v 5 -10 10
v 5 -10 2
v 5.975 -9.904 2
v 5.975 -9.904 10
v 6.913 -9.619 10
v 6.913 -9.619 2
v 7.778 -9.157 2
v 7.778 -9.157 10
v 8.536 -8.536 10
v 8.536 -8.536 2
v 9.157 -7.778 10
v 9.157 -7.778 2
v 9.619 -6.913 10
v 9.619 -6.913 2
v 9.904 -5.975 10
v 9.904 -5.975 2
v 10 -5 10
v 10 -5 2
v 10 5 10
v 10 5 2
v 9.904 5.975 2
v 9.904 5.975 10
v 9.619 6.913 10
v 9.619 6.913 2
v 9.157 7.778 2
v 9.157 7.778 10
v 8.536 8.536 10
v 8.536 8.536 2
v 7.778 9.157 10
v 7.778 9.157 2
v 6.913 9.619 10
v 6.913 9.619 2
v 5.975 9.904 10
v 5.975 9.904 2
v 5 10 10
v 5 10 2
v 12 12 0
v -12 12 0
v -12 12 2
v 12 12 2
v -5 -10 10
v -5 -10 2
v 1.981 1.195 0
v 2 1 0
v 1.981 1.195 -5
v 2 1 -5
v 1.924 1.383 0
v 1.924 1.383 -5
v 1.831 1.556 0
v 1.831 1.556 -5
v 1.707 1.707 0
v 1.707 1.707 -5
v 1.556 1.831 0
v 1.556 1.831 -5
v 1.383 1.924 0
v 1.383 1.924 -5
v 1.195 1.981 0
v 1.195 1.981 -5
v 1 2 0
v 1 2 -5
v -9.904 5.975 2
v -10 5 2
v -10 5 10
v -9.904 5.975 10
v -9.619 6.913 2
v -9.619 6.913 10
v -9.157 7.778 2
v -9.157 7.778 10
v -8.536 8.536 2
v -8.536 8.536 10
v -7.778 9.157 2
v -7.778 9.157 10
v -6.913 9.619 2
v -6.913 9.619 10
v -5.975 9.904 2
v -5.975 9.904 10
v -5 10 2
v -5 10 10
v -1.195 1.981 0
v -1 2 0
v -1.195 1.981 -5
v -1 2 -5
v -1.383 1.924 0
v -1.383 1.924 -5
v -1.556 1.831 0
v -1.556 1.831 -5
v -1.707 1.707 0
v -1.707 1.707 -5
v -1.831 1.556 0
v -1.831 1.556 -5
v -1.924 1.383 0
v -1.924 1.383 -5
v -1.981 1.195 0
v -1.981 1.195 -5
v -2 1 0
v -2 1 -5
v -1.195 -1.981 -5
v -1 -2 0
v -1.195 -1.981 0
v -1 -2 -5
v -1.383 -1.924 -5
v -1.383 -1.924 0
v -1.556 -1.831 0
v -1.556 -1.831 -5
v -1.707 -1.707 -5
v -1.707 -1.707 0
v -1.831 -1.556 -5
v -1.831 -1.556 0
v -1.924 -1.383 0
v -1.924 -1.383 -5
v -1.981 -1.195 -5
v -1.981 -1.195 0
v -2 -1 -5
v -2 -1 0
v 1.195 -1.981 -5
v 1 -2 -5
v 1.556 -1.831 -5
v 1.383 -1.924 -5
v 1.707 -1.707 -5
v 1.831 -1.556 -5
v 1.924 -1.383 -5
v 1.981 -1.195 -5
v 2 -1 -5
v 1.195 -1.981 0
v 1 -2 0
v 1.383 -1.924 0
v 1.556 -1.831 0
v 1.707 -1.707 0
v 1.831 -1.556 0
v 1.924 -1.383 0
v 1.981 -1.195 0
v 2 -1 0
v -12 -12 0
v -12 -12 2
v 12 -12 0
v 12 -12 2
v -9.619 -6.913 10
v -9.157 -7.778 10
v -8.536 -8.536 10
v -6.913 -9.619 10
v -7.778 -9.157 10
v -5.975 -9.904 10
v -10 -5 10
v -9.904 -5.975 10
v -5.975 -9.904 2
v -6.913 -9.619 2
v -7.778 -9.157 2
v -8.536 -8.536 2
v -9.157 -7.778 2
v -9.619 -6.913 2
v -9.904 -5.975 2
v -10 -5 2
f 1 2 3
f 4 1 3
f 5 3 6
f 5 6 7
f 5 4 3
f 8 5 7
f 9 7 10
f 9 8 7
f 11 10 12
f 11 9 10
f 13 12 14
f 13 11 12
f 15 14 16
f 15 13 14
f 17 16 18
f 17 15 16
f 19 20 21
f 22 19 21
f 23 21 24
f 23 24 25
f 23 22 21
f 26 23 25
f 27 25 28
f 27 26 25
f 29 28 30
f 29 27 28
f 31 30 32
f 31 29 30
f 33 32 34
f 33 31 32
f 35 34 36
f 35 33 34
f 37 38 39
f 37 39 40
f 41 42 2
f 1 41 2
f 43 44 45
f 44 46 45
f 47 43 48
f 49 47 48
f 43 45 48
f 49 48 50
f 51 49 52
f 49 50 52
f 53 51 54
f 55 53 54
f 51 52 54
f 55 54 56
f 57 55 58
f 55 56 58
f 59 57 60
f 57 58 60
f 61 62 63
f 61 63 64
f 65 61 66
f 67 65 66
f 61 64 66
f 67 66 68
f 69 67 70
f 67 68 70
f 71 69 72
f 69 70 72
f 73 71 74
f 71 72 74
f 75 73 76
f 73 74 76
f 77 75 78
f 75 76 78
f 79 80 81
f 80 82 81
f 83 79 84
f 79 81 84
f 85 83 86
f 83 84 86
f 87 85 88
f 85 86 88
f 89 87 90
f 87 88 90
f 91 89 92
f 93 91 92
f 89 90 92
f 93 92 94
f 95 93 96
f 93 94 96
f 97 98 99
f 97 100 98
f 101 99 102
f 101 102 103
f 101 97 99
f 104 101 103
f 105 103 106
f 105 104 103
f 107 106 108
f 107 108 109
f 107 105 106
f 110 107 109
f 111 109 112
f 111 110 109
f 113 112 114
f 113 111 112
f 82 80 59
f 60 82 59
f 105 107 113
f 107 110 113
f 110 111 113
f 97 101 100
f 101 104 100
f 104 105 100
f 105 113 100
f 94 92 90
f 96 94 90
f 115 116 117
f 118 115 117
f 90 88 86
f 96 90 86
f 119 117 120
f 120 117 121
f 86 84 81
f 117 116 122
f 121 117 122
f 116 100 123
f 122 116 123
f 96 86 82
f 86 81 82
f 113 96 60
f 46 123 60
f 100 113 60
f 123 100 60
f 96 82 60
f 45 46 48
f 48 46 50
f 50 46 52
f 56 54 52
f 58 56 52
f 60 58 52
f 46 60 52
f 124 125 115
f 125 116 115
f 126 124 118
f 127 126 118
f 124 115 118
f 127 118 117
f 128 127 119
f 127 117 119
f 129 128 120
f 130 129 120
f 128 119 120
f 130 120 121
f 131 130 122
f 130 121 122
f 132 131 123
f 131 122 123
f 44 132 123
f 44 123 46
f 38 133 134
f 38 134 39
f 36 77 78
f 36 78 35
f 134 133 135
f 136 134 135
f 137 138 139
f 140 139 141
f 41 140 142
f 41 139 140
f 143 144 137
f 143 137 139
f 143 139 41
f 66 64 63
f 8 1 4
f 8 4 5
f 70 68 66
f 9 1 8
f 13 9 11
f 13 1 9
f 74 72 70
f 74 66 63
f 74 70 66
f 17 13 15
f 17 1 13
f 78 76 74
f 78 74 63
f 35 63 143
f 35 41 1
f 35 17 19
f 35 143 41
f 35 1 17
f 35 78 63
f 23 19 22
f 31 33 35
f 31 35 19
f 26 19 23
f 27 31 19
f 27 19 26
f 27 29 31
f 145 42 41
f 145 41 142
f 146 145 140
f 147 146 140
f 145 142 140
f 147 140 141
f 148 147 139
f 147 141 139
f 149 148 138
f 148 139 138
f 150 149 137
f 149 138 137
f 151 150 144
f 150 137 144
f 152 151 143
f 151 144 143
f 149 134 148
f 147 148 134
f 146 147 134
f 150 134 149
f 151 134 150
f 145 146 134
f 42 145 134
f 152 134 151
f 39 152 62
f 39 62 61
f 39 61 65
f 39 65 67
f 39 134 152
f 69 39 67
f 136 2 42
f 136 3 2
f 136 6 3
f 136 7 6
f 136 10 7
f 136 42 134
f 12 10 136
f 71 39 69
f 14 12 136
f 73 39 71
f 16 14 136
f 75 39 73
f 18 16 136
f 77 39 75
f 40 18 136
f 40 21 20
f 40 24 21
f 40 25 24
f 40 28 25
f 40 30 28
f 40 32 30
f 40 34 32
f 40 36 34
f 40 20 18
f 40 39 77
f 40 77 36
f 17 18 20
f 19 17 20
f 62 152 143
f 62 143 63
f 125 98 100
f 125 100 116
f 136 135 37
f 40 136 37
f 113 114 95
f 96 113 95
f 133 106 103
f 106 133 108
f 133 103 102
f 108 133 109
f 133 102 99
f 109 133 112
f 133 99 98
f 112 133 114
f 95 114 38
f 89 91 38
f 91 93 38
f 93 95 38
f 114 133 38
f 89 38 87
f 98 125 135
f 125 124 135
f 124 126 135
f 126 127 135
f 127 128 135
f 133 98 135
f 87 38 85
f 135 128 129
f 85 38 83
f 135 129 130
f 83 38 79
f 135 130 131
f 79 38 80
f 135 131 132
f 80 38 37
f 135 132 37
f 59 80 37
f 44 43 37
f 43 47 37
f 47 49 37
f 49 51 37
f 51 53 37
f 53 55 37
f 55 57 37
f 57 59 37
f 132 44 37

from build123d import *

# Parameters (mm, degrees)
F0_W     = 20
F0_H     = 20
F0_W_2   = 4
F0_H_2   = 4
F0_R     = 1.6
F1_DEPTH = 10
F0_W_3   = 24
F0_H_3   = 24
F2_DEPTH = 2
F3_DEPTH = 5
F5_R     = 5
F6_R     = 5
F7_R     = 1


# Not quite as in the source:
# - the program builds the solid bodies; features that only make, move or delete a surface that nothing else refers to are left out


with BuildPart() as f1:
    # F0 (on Top) → F1 (new body)
    with BuildSketch(Plane.XY):
        Rectangle(F0_W, F0_H)
        Rectangle(F0_W_2, F0_H_2, mode=Mode.SUBTRACT)
        Rectangle(F0_W_2, F0_H_2)
        Circle(F0_R, mode=Mode.SUBTRACT)
        Circle(F0_R)
    extrude(amount=F1_DEPTH)

    # F0 (on Top) → F2 (join)
    with BuildSketch(Plane.XY):
        Rectangle(F0_W_3, F0_H_3)
        Rectangle(F0_W, F0_H, mode=Mode.SUBTRACT)
    extrude(amount=F2_DEPTH)

    # F0 (on Top) → F3 (join)
    with BuildSketch(Plane.XY):
        Rectangle(F0_W_2, F0_H_2)
        Circle(F0_R, mode=Mode.SUBTRACT)
        Circle(F0_R)
    extrude(amount=-F3_DEPTH)

    # F5
    f5_edges = [f1.edges().sort_by_distance(p)[0] for p in [
        (-10, -10, 6),
    ]]
    fillet(f5_edges, radius=F5_R)

    # F6
    f6_edges = [f1.edges().sort_by_distance(p)[0] for p in [
        (10, -10, 6),
        (10, 10, 6),
        (-10, 10, 6),
    ]]
    fillet(f6_edges, radius=F6_R)

    # F7
    f7_edges = [f1.edges().sort_by_distance(p)[0] for p in [
        (2, 2, -2.5),
        (2, -2, -2.5),
        (-2, -2, -2.5),
        (-2, 2, -2.5),
    ]]
    fillet(f7_edges, radius=F7_R)


solid = f1.part
